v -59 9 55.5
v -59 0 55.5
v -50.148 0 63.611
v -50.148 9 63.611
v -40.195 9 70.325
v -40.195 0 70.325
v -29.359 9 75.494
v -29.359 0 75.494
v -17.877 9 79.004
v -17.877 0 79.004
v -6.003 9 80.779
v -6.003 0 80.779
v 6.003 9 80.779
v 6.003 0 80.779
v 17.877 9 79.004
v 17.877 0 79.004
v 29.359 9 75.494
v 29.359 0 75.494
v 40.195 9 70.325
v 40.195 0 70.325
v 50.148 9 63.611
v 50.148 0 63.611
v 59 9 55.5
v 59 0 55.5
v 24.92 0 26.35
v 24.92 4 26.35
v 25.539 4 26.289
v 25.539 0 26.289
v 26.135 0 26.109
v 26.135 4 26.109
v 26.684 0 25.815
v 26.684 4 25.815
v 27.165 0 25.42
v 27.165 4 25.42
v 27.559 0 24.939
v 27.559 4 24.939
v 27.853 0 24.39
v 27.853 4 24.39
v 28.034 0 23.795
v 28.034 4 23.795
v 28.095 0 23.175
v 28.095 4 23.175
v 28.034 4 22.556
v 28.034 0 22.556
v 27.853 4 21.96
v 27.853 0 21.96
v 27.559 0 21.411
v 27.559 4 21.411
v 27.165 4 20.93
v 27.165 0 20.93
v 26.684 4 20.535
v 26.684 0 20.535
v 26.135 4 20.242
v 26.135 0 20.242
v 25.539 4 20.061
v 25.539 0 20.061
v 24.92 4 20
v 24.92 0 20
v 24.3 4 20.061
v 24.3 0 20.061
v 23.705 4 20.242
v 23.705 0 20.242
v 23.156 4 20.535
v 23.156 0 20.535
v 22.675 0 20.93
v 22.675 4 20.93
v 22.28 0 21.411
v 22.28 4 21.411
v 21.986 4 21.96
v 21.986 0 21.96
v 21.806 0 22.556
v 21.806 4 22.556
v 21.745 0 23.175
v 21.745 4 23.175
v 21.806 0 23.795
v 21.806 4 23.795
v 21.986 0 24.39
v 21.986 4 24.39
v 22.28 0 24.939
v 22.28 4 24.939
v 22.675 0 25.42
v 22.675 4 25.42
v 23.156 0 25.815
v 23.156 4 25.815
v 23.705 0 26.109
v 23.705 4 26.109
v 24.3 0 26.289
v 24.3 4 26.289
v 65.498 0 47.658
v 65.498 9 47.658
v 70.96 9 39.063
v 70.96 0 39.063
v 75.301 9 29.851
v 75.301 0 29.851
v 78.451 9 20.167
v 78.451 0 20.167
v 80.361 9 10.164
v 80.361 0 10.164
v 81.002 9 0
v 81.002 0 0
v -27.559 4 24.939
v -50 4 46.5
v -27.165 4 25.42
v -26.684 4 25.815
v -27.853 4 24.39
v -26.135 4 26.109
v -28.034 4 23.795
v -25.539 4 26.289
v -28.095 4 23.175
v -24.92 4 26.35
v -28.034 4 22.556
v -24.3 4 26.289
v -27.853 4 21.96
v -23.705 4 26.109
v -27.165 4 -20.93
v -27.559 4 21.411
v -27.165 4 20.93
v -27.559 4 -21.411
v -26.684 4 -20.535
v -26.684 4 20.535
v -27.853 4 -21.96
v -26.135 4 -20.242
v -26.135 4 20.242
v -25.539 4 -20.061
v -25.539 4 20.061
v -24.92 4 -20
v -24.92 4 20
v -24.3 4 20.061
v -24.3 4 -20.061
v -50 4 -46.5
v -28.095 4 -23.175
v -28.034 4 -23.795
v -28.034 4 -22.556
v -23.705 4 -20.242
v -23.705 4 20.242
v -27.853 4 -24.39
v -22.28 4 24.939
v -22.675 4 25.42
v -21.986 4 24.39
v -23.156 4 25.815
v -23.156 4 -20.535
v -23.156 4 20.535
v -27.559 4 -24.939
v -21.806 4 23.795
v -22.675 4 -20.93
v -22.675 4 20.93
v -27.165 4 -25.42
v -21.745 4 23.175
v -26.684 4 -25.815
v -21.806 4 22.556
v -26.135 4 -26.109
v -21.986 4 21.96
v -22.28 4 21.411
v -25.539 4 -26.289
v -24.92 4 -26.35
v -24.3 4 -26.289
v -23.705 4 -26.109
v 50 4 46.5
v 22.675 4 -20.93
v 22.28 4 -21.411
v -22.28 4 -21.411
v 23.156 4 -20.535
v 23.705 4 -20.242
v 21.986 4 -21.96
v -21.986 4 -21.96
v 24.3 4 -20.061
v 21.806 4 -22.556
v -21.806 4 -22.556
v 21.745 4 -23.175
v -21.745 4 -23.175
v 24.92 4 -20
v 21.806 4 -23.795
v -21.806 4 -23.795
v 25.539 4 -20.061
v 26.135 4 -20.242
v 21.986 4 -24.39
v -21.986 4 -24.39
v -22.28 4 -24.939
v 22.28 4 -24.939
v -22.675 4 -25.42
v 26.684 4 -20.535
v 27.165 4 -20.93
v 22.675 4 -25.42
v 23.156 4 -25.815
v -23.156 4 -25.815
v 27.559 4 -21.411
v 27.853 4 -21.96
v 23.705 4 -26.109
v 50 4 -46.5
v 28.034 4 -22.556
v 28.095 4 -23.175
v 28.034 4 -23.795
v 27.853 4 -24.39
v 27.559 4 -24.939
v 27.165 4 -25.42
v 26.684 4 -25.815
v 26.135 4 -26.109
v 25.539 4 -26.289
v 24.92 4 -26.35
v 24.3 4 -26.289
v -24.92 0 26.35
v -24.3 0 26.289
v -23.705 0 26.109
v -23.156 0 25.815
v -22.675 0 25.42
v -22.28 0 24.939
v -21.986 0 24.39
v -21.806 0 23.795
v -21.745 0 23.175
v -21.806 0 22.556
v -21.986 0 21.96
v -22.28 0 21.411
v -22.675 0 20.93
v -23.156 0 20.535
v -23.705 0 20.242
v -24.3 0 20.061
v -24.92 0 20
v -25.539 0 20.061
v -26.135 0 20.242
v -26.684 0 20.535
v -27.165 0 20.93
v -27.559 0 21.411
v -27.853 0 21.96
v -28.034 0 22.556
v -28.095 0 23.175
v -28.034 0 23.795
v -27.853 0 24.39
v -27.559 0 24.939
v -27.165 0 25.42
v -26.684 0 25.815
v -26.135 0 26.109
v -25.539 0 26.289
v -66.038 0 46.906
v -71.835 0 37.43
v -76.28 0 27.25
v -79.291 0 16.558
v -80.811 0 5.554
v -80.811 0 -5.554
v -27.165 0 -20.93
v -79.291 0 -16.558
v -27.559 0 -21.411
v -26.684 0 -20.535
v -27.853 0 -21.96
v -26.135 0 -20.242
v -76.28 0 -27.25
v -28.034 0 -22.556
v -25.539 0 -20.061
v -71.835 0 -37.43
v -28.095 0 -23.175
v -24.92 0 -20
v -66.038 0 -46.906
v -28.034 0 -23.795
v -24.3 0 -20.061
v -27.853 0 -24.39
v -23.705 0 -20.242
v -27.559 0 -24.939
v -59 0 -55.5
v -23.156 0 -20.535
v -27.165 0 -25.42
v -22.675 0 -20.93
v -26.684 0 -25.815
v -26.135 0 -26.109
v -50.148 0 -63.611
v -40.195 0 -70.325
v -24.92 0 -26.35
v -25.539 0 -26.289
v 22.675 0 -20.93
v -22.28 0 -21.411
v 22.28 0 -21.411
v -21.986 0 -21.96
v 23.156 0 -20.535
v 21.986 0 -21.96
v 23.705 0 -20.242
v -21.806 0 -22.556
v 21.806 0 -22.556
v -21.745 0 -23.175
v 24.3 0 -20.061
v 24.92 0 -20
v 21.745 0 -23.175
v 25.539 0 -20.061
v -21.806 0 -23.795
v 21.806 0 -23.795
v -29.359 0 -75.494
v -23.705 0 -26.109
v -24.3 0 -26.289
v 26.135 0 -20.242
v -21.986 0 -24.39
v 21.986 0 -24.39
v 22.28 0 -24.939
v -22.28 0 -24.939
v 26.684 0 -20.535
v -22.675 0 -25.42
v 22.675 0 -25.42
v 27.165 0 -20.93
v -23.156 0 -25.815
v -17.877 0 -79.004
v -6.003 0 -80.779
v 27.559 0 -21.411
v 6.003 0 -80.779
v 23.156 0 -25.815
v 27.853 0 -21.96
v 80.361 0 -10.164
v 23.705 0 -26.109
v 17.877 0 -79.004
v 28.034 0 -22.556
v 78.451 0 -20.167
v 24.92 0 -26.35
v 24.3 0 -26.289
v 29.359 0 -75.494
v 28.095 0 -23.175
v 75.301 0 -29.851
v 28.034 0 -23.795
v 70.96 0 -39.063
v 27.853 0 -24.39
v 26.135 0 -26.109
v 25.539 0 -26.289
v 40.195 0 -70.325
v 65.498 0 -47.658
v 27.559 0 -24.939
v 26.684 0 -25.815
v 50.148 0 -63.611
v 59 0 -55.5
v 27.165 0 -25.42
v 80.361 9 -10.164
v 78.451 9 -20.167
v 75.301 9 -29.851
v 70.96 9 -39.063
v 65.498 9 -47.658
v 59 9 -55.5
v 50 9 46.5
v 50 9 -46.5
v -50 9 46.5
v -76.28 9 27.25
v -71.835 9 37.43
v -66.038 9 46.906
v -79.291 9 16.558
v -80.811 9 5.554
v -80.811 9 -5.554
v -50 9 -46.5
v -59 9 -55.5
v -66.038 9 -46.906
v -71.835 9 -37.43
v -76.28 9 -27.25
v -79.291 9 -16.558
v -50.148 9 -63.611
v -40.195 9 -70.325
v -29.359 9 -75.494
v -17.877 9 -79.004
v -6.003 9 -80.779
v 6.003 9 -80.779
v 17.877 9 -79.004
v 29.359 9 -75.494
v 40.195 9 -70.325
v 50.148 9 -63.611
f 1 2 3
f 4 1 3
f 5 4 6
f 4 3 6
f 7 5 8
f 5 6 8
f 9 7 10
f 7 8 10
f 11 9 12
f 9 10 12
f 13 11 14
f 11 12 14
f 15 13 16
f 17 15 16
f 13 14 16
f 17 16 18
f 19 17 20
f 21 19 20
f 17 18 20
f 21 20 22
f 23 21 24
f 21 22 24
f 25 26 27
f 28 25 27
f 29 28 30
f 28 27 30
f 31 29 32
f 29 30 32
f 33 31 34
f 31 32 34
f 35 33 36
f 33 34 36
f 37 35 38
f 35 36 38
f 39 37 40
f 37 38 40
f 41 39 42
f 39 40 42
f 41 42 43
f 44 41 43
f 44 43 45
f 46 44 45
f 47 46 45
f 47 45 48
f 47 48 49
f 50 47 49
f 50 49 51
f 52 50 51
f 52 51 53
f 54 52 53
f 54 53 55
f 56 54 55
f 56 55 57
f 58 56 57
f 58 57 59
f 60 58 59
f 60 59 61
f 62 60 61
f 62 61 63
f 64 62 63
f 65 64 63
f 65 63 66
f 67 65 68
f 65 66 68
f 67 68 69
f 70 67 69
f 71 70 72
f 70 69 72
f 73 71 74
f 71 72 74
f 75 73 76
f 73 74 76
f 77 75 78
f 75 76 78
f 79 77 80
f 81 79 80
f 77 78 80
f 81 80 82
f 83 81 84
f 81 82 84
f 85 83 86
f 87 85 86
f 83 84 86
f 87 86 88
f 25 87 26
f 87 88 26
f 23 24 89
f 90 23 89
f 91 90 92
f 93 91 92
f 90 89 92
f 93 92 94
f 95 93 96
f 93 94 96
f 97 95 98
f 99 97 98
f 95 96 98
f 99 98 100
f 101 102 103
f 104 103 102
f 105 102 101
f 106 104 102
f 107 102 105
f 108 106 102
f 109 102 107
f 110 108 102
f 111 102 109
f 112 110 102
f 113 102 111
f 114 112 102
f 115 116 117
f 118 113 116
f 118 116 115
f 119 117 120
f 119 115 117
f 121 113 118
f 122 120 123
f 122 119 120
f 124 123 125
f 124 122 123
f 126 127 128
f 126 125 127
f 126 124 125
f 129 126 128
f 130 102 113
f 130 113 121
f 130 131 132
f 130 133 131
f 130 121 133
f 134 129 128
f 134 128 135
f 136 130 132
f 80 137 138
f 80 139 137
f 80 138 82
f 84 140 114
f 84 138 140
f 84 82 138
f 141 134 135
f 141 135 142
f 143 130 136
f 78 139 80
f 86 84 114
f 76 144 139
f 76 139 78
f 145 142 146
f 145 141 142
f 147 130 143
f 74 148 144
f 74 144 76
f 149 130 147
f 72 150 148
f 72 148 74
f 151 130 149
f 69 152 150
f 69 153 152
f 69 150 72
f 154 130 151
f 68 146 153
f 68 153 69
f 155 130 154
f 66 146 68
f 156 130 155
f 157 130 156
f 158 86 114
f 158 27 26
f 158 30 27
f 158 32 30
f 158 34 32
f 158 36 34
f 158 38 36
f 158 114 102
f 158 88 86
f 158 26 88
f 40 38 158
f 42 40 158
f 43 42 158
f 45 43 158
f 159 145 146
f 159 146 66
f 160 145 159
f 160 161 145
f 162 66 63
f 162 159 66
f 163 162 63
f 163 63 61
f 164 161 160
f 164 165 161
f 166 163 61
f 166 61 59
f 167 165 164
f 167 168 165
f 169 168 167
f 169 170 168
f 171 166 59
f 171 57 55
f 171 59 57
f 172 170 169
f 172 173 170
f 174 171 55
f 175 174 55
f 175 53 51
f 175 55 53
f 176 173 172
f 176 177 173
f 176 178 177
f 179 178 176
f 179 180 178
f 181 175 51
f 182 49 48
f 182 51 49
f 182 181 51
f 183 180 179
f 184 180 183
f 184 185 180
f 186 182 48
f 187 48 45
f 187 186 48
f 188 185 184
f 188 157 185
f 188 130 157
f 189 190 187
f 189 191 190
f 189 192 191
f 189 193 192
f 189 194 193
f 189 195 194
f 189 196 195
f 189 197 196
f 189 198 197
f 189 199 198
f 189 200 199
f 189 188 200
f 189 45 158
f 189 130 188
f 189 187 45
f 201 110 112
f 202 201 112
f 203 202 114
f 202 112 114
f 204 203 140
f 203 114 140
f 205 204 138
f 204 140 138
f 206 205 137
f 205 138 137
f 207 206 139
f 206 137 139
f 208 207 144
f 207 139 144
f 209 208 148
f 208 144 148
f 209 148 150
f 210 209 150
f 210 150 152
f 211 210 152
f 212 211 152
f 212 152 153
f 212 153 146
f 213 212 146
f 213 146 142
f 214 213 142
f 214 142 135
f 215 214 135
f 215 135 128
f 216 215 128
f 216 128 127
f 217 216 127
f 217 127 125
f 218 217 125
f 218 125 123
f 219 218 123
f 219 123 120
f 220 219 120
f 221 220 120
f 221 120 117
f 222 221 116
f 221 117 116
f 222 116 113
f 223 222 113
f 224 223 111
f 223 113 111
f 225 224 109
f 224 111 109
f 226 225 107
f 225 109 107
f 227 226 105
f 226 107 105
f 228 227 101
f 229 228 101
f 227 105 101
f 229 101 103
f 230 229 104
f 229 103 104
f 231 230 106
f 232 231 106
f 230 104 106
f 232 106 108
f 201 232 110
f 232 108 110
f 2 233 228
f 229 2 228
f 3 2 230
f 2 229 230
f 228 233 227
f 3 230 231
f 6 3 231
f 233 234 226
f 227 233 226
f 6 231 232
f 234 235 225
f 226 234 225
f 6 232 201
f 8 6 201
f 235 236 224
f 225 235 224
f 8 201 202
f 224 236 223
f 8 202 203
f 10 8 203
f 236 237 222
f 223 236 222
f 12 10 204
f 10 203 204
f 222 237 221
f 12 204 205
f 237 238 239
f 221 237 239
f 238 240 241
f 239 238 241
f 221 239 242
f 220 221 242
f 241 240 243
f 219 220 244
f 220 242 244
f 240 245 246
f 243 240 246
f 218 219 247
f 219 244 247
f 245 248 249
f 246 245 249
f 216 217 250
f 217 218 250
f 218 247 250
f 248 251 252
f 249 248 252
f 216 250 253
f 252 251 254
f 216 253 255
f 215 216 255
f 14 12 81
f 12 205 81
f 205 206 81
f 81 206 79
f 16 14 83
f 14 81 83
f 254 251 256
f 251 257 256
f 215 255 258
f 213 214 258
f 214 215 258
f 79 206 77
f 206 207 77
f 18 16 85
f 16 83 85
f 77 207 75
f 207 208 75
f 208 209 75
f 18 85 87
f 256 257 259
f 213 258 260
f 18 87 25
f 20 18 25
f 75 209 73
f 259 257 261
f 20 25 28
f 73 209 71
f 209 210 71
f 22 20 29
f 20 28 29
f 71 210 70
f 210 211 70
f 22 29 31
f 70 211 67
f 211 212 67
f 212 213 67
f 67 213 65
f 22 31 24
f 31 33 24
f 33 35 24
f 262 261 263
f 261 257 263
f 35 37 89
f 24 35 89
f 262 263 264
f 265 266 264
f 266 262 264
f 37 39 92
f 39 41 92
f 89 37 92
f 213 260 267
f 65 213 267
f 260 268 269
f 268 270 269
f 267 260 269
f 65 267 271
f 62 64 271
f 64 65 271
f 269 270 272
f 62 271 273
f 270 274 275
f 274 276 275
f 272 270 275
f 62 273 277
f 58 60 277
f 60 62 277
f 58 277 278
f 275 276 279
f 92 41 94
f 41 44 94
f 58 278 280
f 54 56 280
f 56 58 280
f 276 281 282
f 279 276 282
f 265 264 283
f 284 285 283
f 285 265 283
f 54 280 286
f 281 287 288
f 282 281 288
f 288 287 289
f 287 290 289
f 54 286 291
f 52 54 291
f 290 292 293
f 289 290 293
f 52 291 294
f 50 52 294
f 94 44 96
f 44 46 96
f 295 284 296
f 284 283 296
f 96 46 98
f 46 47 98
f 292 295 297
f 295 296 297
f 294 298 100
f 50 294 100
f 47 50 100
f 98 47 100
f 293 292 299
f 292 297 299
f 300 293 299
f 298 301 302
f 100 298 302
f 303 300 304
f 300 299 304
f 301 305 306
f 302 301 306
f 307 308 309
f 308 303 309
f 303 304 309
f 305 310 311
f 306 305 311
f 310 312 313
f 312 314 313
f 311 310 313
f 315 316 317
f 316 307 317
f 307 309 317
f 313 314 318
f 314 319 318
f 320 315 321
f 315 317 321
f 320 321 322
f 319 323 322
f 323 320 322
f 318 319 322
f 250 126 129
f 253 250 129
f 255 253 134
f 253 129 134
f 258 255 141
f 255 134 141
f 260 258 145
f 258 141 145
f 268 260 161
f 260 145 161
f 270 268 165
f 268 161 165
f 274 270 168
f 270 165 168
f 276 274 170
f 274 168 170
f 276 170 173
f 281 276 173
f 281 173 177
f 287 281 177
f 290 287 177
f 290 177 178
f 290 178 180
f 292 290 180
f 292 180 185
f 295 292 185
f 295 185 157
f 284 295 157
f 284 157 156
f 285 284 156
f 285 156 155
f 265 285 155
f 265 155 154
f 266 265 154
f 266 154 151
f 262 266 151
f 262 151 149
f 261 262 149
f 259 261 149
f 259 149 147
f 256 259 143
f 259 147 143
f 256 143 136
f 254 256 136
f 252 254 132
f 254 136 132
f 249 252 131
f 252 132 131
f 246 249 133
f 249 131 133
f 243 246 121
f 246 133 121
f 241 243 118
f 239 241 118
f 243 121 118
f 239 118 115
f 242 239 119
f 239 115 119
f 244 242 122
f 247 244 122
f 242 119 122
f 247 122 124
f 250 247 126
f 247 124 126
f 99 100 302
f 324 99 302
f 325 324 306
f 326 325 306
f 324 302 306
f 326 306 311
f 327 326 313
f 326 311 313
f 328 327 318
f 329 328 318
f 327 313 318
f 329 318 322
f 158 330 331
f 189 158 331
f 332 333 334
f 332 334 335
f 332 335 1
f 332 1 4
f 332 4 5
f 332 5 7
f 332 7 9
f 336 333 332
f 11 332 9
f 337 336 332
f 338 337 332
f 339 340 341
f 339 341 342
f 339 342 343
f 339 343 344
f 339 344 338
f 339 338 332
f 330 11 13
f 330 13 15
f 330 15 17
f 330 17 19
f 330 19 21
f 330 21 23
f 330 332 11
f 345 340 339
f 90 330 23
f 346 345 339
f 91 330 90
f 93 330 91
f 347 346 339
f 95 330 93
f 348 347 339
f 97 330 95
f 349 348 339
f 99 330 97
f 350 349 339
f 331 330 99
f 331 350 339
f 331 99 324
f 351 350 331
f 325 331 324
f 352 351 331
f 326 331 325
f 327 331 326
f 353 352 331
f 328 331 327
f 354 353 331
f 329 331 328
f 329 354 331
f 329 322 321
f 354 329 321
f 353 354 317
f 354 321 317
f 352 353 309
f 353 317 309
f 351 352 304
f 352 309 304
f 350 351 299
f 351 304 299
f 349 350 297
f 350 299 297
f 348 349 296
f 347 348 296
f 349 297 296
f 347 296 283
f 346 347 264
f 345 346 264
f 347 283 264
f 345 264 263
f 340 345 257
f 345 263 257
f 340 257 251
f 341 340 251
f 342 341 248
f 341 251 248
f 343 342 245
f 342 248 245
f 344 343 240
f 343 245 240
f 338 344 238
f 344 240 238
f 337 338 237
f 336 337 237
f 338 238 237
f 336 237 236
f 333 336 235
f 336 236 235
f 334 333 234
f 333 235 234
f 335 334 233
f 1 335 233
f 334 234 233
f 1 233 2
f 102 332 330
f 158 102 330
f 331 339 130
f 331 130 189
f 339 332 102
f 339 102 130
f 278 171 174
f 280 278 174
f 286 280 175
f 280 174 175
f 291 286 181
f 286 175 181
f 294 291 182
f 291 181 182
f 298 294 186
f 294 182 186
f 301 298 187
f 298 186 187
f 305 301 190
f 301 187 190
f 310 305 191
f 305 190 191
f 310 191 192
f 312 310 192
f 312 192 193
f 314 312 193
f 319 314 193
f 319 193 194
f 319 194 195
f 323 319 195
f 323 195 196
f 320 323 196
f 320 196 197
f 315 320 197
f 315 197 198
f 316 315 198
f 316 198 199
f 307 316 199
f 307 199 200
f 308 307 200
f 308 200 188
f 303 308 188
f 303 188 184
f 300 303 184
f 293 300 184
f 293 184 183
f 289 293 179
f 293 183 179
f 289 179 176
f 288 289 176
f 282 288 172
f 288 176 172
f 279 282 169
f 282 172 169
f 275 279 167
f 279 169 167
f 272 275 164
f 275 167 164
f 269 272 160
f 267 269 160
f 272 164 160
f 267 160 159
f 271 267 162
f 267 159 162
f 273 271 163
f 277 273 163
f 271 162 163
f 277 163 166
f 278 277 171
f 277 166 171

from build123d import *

# Parameters (mm, degrees)
SKETCH1_R           = 81.001543195
BOSS_EXTRUDE1_DEPTH = 9
SKETCH2_W           = 100
SKETCH2_H           = 93
SKETCH2_R           = 3.175
CUT_EXTRUDE1_DEPTH  = 5
SKETCH2_3_R         = 3.175
CUT_EXTRUDE2_DEPTH  = 115.906483716


with BuildPart() as part:
    # Sketch1 → Boss-Extrude1 (new body)
    with BuildSketch(Plane(origin=(0, 0, 0), x_dir=(1, 0, 0), z_dir=(0, 1, 0))):
        Circle(SKETCH1_R)
    extrude(amount=BOSS_EXTRUDE1_DEPTH)

    # Sketch2 → Cut-Extrude1 (cut)
    with BuildSketch(Plane(origin=(0, 9, 0), x_dir=(1, 0, 0), z_dir=(0, 1, 0))):
        Rectangle(SKETCH2_W, SKETCH2_H)
        with Locations((-24.919571738, -23.175201717)):
            Circle(SKETCH2_R, mode=Mode.SUBTRACT)
        with Locations((24.919571738, -23.175201717)):
            Circle(SKETCH2_R, mode=Mode.SUBTRACT)
        with Locations((-24.919571738, 23.175201717)):
            Circle(SKETCH2_R, mode=Mode.SUBTRACT)
        with Locations((24.919571738, 23.175201717)):
            Circle(SKETCH2_R, mode=Mode.SUBTRACT)
    extrude(amount=-CUT_EXTRUDE1_DEPTH, mode=Mode.SUBTRACT)

    # Sketch2<3> → Cut-Extrude2 (cut, through all)
    with BuildSketch(Plane(origin=(0, 9, 0), x_dir=(1, 0, 0), z_dir=(0, 1, 0))):
        with Locations((-24.919571738, -23.175201717)):
            Circle(SKETCH2_3_R)
        with Locations((24.919571738, -23.175201717)):
            Circle(SKETCH2_3_R)
        with Locations((24.919571738, 23.175201717)):
            Circle(SKETCH2_3_R)
        with Locations((-24.919571738, 23.175201717)):
            Circle(SKETCH2_3_R)
    extrude(amount=-CUT_EXTRUDE2_DEPTH, mode=Mode.SUBTRACT)


solid = part.part
